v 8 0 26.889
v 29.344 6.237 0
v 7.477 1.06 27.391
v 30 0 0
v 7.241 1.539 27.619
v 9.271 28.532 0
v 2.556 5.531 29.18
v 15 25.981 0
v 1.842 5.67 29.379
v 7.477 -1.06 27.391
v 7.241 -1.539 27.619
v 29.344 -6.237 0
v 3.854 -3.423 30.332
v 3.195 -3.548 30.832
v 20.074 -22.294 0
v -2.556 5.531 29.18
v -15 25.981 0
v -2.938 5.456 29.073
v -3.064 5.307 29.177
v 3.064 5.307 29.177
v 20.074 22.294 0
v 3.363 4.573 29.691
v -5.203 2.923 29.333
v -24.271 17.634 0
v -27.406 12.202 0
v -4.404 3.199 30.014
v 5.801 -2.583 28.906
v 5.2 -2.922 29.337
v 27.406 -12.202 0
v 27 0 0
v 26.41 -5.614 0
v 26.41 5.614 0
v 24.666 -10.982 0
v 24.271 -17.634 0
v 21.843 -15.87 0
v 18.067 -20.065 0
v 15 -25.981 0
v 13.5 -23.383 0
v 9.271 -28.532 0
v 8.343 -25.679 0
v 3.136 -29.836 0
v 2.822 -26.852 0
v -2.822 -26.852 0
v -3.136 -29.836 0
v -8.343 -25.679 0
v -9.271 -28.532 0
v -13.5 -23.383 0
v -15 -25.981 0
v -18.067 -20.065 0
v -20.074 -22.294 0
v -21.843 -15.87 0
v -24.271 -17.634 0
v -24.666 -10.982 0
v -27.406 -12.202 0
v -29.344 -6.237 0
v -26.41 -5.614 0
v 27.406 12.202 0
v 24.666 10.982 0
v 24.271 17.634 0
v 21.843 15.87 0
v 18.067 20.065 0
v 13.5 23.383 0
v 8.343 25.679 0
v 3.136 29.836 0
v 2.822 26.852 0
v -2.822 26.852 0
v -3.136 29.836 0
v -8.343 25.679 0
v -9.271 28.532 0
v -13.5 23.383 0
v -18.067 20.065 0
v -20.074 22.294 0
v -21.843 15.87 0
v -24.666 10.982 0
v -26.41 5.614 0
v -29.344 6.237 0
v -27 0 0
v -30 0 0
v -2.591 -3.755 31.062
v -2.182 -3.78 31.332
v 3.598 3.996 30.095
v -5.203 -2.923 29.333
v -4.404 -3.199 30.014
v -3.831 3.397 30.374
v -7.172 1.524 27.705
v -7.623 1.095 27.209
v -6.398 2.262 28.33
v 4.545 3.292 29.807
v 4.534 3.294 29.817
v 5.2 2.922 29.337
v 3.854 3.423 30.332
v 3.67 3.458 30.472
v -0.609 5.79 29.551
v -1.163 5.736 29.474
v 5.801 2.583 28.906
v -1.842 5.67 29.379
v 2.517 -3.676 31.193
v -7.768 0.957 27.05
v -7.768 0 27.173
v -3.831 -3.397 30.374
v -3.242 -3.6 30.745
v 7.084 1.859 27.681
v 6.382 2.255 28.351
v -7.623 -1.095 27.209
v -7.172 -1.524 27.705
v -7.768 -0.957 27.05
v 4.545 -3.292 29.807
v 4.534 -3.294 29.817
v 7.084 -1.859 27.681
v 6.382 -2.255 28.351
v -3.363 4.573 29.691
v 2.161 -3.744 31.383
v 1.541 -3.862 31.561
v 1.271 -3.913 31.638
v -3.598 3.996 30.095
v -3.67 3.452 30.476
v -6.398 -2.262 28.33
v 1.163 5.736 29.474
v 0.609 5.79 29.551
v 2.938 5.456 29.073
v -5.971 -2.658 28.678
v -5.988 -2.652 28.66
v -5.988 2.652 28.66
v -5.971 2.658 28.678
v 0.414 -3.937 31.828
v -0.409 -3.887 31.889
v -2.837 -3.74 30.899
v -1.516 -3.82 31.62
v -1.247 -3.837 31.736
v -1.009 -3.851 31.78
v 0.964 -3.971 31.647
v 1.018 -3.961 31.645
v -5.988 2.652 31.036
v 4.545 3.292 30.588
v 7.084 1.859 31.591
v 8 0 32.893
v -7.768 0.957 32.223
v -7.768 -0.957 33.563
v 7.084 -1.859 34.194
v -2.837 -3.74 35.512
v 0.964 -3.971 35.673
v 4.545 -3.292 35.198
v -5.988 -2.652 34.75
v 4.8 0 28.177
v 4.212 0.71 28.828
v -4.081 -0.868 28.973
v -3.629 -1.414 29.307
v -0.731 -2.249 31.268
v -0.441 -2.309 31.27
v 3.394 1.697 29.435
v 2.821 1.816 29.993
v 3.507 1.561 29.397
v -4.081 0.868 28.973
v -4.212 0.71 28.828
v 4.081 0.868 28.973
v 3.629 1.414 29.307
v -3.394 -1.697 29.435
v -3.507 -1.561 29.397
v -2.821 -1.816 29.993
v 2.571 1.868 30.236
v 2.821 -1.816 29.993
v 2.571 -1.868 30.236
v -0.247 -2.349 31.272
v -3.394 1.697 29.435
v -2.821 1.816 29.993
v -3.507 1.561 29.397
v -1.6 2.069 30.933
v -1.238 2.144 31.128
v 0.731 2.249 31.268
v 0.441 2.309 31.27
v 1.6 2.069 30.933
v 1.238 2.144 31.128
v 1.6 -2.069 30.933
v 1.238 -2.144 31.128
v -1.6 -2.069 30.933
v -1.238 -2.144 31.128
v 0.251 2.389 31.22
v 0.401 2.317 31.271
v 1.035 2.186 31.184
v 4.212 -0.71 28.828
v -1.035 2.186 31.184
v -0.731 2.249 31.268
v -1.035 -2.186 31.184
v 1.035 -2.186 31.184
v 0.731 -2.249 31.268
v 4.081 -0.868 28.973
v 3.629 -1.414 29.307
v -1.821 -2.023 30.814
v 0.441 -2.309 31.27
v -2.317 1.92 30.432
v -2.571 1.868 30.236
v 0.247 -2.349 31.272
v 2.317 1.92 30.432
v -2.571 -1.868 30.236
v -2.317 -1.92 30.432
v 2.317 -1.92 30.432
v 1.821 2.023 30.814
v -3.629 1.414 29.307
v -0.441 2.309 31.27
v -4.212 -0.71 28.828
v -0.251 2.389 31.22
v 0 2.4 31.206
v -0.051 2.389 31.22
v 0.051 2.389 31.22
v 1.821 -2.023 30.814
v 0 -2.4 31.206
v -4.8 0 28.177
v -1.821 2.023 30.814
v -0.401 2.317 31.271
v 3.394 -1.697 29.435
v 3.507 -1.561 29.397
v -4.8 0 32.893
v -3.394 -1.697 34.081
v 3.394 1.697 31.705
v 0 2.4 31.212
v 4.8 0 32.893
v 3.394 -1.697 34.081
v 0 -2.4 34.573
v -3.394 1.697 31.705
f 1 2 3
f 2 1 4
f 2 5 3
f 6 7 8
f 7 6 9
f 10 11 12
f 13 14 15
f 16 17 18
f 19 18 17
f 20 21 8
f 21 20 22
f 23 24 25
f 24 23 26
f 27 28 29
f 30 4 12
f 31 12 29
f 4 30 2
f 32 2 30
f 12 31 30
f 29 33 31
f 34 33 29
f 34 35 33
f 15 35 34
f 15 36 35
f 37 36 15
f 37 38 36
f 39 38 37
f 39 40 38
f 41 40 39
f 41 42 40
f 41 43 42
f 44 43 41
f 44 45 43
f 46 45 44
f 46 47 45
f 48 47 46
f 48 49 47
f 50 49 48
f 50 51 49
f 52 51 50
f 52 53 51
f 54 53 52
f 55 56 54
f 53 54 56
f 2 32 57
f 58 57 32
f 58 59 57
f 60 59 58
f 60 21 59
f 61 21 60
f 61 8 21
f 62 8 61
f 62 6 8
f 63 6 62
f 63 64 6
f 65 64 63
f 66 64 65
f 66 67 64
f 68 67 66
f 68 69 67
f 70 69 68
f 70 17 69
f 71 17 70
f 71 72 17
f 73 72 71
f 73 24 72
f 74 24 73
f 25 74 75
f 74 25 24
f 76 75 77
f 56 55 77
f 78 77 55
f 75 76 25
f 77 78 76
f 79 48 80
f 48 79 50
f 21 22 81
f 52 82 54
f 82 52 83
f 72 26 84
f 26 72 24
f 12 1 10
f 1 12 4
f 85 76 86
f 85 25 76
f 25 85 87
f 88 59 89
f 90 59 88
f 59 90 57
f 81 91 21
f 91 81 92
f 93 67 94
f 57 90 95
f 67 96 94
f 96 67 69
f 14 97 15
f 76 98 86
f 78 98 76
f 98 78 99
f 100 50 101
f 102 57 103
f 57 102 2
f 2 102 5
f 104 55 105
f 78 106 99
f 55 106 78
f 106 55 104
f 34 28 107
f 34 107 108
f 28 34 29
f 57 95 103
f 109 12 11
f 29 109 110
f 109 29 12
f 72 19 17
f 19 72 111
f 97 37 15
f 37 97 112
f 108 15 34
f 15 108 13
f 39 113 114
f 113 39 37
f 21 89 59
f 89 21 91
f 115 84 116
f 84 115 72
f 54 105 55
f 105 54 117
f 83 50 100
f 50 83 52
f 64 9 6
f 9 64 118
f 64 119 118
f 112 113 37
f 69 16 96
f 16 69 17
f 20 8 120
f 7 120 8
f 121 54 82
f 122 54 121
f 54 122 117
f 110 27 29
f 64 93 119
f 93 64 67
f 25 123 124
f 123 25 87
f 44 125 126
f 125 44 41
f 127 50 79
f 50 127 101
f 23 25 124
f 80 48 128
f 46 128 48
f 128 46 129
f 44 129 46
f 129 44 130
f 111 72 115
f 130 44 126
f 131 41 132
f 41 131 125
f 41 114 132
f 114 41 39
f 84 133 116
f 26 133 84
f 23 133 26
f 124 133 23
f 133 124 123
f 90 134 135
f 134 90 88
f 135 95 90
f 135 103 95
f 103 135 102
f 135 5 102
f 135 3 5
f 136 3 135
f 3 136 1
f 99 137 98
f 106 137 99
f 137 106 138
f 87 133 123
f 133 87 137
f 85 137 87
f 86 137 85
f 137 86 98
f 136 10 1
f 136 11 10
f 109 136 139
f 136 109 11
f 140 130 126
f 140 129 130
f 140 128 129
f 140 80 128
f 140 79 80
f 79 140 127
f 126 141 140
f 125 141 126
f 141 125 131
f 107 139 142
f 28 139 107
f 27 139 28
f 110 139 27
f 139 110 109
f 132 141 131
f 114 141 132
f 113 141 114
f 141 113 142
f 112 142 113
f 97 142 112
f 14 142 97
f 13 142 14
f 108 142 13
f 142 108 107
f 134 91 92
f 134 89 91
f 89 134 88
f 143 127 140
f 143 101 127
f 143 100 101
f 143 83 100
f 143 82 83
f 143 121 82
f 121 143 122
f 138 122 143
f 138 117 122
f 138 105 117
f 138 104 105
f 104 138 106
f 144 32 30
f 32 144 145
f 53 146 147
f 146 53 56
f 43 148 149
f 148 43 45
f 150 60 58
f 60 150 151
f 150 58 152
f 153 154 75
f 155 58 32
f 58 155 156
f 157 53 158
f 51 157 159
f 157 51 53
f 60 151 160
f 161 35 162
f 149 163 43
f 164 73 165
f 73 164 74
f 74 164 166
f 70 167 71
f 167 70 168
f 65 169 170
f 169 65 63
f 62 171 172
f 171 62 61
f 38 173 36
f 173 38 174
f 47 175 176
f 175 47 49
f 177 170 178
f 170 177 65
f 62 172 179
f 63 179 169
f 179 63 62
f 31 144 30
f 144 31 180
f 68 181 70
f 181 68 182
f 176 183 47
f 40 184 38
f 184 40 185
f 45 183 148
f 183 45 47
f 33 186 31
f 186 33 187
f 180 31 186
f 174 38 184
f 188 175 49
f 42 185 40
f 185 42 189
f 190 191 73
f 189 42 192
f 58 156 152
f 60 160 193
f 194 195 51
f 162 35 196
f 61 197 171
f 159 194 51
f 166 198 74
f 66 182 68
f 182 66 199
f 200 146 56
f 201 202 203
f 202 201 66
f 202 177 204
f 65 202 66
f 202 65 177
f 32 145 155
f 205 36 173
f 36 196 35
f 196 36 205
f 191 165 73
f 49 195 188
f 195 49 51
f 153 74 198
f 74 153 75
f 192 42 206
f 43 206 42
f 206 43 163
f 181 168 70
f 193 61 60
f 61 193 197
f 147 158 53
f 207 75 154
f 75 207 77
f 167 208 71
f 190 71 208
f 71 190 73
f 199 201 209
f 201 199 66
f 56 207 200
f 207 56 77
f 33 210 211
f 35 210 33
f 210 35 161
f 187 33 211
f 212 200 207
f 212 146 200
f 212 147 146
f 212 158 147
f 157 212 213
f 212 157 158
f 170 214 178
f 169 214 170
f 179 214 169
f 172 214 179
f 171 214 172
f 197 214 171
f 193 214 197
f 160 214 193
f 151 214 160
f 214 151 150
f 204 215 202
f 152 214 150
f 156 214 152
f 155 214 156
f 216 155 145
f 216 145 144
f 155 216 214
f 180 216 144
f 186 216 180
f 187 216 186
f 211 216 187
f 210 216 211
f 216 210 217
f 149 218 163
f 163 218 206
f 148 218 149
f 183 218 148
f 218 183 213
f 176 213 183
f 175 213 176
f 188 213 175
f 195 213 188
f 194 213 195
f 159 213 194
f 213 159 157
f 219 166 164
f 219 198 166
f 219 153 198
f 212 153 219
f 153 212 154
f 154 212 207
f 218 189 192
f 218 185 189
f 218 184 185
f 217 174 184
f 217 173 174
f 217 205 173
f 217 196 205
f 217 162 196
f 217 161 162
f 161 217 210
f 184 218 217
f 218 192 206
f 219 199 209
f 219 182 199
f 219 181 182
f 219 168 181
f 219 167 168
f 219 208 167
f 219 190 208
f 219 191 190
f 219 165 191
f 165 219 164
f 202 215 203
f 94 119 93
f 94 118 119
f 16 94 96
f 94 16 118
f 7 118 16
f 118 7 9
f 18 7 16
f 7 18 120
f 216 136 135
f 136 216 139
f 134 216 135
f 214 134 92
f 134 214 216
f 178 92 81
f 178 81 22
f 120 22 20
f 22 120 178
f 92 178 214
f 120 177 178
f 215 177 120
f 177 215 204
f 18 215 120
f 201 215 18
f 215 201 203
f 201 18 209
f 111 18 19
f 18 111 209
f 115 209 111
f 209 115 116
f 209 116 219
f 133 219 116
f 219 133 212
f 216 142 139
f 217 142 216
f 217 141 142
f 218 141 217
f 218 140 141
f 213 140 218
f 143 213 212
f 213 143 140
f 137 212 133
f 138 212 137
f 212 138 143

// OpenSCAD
n_grid=7;


difference(){
	union(){
		cylinder(r1=30, r2=3,h=33);
		translate([0,0,26]) scale([2,1,1]) cylinder(r=4,h=10);
	}
	cylinder(r1=27,r2=1,h=33);
	translate([0,0,26]) scale([2,1,1]) cylinder(r=2.4,h=10);
	#translate([0,3,43]) rotate([55,0,0]) cube([20,20,20],center=true);
}
